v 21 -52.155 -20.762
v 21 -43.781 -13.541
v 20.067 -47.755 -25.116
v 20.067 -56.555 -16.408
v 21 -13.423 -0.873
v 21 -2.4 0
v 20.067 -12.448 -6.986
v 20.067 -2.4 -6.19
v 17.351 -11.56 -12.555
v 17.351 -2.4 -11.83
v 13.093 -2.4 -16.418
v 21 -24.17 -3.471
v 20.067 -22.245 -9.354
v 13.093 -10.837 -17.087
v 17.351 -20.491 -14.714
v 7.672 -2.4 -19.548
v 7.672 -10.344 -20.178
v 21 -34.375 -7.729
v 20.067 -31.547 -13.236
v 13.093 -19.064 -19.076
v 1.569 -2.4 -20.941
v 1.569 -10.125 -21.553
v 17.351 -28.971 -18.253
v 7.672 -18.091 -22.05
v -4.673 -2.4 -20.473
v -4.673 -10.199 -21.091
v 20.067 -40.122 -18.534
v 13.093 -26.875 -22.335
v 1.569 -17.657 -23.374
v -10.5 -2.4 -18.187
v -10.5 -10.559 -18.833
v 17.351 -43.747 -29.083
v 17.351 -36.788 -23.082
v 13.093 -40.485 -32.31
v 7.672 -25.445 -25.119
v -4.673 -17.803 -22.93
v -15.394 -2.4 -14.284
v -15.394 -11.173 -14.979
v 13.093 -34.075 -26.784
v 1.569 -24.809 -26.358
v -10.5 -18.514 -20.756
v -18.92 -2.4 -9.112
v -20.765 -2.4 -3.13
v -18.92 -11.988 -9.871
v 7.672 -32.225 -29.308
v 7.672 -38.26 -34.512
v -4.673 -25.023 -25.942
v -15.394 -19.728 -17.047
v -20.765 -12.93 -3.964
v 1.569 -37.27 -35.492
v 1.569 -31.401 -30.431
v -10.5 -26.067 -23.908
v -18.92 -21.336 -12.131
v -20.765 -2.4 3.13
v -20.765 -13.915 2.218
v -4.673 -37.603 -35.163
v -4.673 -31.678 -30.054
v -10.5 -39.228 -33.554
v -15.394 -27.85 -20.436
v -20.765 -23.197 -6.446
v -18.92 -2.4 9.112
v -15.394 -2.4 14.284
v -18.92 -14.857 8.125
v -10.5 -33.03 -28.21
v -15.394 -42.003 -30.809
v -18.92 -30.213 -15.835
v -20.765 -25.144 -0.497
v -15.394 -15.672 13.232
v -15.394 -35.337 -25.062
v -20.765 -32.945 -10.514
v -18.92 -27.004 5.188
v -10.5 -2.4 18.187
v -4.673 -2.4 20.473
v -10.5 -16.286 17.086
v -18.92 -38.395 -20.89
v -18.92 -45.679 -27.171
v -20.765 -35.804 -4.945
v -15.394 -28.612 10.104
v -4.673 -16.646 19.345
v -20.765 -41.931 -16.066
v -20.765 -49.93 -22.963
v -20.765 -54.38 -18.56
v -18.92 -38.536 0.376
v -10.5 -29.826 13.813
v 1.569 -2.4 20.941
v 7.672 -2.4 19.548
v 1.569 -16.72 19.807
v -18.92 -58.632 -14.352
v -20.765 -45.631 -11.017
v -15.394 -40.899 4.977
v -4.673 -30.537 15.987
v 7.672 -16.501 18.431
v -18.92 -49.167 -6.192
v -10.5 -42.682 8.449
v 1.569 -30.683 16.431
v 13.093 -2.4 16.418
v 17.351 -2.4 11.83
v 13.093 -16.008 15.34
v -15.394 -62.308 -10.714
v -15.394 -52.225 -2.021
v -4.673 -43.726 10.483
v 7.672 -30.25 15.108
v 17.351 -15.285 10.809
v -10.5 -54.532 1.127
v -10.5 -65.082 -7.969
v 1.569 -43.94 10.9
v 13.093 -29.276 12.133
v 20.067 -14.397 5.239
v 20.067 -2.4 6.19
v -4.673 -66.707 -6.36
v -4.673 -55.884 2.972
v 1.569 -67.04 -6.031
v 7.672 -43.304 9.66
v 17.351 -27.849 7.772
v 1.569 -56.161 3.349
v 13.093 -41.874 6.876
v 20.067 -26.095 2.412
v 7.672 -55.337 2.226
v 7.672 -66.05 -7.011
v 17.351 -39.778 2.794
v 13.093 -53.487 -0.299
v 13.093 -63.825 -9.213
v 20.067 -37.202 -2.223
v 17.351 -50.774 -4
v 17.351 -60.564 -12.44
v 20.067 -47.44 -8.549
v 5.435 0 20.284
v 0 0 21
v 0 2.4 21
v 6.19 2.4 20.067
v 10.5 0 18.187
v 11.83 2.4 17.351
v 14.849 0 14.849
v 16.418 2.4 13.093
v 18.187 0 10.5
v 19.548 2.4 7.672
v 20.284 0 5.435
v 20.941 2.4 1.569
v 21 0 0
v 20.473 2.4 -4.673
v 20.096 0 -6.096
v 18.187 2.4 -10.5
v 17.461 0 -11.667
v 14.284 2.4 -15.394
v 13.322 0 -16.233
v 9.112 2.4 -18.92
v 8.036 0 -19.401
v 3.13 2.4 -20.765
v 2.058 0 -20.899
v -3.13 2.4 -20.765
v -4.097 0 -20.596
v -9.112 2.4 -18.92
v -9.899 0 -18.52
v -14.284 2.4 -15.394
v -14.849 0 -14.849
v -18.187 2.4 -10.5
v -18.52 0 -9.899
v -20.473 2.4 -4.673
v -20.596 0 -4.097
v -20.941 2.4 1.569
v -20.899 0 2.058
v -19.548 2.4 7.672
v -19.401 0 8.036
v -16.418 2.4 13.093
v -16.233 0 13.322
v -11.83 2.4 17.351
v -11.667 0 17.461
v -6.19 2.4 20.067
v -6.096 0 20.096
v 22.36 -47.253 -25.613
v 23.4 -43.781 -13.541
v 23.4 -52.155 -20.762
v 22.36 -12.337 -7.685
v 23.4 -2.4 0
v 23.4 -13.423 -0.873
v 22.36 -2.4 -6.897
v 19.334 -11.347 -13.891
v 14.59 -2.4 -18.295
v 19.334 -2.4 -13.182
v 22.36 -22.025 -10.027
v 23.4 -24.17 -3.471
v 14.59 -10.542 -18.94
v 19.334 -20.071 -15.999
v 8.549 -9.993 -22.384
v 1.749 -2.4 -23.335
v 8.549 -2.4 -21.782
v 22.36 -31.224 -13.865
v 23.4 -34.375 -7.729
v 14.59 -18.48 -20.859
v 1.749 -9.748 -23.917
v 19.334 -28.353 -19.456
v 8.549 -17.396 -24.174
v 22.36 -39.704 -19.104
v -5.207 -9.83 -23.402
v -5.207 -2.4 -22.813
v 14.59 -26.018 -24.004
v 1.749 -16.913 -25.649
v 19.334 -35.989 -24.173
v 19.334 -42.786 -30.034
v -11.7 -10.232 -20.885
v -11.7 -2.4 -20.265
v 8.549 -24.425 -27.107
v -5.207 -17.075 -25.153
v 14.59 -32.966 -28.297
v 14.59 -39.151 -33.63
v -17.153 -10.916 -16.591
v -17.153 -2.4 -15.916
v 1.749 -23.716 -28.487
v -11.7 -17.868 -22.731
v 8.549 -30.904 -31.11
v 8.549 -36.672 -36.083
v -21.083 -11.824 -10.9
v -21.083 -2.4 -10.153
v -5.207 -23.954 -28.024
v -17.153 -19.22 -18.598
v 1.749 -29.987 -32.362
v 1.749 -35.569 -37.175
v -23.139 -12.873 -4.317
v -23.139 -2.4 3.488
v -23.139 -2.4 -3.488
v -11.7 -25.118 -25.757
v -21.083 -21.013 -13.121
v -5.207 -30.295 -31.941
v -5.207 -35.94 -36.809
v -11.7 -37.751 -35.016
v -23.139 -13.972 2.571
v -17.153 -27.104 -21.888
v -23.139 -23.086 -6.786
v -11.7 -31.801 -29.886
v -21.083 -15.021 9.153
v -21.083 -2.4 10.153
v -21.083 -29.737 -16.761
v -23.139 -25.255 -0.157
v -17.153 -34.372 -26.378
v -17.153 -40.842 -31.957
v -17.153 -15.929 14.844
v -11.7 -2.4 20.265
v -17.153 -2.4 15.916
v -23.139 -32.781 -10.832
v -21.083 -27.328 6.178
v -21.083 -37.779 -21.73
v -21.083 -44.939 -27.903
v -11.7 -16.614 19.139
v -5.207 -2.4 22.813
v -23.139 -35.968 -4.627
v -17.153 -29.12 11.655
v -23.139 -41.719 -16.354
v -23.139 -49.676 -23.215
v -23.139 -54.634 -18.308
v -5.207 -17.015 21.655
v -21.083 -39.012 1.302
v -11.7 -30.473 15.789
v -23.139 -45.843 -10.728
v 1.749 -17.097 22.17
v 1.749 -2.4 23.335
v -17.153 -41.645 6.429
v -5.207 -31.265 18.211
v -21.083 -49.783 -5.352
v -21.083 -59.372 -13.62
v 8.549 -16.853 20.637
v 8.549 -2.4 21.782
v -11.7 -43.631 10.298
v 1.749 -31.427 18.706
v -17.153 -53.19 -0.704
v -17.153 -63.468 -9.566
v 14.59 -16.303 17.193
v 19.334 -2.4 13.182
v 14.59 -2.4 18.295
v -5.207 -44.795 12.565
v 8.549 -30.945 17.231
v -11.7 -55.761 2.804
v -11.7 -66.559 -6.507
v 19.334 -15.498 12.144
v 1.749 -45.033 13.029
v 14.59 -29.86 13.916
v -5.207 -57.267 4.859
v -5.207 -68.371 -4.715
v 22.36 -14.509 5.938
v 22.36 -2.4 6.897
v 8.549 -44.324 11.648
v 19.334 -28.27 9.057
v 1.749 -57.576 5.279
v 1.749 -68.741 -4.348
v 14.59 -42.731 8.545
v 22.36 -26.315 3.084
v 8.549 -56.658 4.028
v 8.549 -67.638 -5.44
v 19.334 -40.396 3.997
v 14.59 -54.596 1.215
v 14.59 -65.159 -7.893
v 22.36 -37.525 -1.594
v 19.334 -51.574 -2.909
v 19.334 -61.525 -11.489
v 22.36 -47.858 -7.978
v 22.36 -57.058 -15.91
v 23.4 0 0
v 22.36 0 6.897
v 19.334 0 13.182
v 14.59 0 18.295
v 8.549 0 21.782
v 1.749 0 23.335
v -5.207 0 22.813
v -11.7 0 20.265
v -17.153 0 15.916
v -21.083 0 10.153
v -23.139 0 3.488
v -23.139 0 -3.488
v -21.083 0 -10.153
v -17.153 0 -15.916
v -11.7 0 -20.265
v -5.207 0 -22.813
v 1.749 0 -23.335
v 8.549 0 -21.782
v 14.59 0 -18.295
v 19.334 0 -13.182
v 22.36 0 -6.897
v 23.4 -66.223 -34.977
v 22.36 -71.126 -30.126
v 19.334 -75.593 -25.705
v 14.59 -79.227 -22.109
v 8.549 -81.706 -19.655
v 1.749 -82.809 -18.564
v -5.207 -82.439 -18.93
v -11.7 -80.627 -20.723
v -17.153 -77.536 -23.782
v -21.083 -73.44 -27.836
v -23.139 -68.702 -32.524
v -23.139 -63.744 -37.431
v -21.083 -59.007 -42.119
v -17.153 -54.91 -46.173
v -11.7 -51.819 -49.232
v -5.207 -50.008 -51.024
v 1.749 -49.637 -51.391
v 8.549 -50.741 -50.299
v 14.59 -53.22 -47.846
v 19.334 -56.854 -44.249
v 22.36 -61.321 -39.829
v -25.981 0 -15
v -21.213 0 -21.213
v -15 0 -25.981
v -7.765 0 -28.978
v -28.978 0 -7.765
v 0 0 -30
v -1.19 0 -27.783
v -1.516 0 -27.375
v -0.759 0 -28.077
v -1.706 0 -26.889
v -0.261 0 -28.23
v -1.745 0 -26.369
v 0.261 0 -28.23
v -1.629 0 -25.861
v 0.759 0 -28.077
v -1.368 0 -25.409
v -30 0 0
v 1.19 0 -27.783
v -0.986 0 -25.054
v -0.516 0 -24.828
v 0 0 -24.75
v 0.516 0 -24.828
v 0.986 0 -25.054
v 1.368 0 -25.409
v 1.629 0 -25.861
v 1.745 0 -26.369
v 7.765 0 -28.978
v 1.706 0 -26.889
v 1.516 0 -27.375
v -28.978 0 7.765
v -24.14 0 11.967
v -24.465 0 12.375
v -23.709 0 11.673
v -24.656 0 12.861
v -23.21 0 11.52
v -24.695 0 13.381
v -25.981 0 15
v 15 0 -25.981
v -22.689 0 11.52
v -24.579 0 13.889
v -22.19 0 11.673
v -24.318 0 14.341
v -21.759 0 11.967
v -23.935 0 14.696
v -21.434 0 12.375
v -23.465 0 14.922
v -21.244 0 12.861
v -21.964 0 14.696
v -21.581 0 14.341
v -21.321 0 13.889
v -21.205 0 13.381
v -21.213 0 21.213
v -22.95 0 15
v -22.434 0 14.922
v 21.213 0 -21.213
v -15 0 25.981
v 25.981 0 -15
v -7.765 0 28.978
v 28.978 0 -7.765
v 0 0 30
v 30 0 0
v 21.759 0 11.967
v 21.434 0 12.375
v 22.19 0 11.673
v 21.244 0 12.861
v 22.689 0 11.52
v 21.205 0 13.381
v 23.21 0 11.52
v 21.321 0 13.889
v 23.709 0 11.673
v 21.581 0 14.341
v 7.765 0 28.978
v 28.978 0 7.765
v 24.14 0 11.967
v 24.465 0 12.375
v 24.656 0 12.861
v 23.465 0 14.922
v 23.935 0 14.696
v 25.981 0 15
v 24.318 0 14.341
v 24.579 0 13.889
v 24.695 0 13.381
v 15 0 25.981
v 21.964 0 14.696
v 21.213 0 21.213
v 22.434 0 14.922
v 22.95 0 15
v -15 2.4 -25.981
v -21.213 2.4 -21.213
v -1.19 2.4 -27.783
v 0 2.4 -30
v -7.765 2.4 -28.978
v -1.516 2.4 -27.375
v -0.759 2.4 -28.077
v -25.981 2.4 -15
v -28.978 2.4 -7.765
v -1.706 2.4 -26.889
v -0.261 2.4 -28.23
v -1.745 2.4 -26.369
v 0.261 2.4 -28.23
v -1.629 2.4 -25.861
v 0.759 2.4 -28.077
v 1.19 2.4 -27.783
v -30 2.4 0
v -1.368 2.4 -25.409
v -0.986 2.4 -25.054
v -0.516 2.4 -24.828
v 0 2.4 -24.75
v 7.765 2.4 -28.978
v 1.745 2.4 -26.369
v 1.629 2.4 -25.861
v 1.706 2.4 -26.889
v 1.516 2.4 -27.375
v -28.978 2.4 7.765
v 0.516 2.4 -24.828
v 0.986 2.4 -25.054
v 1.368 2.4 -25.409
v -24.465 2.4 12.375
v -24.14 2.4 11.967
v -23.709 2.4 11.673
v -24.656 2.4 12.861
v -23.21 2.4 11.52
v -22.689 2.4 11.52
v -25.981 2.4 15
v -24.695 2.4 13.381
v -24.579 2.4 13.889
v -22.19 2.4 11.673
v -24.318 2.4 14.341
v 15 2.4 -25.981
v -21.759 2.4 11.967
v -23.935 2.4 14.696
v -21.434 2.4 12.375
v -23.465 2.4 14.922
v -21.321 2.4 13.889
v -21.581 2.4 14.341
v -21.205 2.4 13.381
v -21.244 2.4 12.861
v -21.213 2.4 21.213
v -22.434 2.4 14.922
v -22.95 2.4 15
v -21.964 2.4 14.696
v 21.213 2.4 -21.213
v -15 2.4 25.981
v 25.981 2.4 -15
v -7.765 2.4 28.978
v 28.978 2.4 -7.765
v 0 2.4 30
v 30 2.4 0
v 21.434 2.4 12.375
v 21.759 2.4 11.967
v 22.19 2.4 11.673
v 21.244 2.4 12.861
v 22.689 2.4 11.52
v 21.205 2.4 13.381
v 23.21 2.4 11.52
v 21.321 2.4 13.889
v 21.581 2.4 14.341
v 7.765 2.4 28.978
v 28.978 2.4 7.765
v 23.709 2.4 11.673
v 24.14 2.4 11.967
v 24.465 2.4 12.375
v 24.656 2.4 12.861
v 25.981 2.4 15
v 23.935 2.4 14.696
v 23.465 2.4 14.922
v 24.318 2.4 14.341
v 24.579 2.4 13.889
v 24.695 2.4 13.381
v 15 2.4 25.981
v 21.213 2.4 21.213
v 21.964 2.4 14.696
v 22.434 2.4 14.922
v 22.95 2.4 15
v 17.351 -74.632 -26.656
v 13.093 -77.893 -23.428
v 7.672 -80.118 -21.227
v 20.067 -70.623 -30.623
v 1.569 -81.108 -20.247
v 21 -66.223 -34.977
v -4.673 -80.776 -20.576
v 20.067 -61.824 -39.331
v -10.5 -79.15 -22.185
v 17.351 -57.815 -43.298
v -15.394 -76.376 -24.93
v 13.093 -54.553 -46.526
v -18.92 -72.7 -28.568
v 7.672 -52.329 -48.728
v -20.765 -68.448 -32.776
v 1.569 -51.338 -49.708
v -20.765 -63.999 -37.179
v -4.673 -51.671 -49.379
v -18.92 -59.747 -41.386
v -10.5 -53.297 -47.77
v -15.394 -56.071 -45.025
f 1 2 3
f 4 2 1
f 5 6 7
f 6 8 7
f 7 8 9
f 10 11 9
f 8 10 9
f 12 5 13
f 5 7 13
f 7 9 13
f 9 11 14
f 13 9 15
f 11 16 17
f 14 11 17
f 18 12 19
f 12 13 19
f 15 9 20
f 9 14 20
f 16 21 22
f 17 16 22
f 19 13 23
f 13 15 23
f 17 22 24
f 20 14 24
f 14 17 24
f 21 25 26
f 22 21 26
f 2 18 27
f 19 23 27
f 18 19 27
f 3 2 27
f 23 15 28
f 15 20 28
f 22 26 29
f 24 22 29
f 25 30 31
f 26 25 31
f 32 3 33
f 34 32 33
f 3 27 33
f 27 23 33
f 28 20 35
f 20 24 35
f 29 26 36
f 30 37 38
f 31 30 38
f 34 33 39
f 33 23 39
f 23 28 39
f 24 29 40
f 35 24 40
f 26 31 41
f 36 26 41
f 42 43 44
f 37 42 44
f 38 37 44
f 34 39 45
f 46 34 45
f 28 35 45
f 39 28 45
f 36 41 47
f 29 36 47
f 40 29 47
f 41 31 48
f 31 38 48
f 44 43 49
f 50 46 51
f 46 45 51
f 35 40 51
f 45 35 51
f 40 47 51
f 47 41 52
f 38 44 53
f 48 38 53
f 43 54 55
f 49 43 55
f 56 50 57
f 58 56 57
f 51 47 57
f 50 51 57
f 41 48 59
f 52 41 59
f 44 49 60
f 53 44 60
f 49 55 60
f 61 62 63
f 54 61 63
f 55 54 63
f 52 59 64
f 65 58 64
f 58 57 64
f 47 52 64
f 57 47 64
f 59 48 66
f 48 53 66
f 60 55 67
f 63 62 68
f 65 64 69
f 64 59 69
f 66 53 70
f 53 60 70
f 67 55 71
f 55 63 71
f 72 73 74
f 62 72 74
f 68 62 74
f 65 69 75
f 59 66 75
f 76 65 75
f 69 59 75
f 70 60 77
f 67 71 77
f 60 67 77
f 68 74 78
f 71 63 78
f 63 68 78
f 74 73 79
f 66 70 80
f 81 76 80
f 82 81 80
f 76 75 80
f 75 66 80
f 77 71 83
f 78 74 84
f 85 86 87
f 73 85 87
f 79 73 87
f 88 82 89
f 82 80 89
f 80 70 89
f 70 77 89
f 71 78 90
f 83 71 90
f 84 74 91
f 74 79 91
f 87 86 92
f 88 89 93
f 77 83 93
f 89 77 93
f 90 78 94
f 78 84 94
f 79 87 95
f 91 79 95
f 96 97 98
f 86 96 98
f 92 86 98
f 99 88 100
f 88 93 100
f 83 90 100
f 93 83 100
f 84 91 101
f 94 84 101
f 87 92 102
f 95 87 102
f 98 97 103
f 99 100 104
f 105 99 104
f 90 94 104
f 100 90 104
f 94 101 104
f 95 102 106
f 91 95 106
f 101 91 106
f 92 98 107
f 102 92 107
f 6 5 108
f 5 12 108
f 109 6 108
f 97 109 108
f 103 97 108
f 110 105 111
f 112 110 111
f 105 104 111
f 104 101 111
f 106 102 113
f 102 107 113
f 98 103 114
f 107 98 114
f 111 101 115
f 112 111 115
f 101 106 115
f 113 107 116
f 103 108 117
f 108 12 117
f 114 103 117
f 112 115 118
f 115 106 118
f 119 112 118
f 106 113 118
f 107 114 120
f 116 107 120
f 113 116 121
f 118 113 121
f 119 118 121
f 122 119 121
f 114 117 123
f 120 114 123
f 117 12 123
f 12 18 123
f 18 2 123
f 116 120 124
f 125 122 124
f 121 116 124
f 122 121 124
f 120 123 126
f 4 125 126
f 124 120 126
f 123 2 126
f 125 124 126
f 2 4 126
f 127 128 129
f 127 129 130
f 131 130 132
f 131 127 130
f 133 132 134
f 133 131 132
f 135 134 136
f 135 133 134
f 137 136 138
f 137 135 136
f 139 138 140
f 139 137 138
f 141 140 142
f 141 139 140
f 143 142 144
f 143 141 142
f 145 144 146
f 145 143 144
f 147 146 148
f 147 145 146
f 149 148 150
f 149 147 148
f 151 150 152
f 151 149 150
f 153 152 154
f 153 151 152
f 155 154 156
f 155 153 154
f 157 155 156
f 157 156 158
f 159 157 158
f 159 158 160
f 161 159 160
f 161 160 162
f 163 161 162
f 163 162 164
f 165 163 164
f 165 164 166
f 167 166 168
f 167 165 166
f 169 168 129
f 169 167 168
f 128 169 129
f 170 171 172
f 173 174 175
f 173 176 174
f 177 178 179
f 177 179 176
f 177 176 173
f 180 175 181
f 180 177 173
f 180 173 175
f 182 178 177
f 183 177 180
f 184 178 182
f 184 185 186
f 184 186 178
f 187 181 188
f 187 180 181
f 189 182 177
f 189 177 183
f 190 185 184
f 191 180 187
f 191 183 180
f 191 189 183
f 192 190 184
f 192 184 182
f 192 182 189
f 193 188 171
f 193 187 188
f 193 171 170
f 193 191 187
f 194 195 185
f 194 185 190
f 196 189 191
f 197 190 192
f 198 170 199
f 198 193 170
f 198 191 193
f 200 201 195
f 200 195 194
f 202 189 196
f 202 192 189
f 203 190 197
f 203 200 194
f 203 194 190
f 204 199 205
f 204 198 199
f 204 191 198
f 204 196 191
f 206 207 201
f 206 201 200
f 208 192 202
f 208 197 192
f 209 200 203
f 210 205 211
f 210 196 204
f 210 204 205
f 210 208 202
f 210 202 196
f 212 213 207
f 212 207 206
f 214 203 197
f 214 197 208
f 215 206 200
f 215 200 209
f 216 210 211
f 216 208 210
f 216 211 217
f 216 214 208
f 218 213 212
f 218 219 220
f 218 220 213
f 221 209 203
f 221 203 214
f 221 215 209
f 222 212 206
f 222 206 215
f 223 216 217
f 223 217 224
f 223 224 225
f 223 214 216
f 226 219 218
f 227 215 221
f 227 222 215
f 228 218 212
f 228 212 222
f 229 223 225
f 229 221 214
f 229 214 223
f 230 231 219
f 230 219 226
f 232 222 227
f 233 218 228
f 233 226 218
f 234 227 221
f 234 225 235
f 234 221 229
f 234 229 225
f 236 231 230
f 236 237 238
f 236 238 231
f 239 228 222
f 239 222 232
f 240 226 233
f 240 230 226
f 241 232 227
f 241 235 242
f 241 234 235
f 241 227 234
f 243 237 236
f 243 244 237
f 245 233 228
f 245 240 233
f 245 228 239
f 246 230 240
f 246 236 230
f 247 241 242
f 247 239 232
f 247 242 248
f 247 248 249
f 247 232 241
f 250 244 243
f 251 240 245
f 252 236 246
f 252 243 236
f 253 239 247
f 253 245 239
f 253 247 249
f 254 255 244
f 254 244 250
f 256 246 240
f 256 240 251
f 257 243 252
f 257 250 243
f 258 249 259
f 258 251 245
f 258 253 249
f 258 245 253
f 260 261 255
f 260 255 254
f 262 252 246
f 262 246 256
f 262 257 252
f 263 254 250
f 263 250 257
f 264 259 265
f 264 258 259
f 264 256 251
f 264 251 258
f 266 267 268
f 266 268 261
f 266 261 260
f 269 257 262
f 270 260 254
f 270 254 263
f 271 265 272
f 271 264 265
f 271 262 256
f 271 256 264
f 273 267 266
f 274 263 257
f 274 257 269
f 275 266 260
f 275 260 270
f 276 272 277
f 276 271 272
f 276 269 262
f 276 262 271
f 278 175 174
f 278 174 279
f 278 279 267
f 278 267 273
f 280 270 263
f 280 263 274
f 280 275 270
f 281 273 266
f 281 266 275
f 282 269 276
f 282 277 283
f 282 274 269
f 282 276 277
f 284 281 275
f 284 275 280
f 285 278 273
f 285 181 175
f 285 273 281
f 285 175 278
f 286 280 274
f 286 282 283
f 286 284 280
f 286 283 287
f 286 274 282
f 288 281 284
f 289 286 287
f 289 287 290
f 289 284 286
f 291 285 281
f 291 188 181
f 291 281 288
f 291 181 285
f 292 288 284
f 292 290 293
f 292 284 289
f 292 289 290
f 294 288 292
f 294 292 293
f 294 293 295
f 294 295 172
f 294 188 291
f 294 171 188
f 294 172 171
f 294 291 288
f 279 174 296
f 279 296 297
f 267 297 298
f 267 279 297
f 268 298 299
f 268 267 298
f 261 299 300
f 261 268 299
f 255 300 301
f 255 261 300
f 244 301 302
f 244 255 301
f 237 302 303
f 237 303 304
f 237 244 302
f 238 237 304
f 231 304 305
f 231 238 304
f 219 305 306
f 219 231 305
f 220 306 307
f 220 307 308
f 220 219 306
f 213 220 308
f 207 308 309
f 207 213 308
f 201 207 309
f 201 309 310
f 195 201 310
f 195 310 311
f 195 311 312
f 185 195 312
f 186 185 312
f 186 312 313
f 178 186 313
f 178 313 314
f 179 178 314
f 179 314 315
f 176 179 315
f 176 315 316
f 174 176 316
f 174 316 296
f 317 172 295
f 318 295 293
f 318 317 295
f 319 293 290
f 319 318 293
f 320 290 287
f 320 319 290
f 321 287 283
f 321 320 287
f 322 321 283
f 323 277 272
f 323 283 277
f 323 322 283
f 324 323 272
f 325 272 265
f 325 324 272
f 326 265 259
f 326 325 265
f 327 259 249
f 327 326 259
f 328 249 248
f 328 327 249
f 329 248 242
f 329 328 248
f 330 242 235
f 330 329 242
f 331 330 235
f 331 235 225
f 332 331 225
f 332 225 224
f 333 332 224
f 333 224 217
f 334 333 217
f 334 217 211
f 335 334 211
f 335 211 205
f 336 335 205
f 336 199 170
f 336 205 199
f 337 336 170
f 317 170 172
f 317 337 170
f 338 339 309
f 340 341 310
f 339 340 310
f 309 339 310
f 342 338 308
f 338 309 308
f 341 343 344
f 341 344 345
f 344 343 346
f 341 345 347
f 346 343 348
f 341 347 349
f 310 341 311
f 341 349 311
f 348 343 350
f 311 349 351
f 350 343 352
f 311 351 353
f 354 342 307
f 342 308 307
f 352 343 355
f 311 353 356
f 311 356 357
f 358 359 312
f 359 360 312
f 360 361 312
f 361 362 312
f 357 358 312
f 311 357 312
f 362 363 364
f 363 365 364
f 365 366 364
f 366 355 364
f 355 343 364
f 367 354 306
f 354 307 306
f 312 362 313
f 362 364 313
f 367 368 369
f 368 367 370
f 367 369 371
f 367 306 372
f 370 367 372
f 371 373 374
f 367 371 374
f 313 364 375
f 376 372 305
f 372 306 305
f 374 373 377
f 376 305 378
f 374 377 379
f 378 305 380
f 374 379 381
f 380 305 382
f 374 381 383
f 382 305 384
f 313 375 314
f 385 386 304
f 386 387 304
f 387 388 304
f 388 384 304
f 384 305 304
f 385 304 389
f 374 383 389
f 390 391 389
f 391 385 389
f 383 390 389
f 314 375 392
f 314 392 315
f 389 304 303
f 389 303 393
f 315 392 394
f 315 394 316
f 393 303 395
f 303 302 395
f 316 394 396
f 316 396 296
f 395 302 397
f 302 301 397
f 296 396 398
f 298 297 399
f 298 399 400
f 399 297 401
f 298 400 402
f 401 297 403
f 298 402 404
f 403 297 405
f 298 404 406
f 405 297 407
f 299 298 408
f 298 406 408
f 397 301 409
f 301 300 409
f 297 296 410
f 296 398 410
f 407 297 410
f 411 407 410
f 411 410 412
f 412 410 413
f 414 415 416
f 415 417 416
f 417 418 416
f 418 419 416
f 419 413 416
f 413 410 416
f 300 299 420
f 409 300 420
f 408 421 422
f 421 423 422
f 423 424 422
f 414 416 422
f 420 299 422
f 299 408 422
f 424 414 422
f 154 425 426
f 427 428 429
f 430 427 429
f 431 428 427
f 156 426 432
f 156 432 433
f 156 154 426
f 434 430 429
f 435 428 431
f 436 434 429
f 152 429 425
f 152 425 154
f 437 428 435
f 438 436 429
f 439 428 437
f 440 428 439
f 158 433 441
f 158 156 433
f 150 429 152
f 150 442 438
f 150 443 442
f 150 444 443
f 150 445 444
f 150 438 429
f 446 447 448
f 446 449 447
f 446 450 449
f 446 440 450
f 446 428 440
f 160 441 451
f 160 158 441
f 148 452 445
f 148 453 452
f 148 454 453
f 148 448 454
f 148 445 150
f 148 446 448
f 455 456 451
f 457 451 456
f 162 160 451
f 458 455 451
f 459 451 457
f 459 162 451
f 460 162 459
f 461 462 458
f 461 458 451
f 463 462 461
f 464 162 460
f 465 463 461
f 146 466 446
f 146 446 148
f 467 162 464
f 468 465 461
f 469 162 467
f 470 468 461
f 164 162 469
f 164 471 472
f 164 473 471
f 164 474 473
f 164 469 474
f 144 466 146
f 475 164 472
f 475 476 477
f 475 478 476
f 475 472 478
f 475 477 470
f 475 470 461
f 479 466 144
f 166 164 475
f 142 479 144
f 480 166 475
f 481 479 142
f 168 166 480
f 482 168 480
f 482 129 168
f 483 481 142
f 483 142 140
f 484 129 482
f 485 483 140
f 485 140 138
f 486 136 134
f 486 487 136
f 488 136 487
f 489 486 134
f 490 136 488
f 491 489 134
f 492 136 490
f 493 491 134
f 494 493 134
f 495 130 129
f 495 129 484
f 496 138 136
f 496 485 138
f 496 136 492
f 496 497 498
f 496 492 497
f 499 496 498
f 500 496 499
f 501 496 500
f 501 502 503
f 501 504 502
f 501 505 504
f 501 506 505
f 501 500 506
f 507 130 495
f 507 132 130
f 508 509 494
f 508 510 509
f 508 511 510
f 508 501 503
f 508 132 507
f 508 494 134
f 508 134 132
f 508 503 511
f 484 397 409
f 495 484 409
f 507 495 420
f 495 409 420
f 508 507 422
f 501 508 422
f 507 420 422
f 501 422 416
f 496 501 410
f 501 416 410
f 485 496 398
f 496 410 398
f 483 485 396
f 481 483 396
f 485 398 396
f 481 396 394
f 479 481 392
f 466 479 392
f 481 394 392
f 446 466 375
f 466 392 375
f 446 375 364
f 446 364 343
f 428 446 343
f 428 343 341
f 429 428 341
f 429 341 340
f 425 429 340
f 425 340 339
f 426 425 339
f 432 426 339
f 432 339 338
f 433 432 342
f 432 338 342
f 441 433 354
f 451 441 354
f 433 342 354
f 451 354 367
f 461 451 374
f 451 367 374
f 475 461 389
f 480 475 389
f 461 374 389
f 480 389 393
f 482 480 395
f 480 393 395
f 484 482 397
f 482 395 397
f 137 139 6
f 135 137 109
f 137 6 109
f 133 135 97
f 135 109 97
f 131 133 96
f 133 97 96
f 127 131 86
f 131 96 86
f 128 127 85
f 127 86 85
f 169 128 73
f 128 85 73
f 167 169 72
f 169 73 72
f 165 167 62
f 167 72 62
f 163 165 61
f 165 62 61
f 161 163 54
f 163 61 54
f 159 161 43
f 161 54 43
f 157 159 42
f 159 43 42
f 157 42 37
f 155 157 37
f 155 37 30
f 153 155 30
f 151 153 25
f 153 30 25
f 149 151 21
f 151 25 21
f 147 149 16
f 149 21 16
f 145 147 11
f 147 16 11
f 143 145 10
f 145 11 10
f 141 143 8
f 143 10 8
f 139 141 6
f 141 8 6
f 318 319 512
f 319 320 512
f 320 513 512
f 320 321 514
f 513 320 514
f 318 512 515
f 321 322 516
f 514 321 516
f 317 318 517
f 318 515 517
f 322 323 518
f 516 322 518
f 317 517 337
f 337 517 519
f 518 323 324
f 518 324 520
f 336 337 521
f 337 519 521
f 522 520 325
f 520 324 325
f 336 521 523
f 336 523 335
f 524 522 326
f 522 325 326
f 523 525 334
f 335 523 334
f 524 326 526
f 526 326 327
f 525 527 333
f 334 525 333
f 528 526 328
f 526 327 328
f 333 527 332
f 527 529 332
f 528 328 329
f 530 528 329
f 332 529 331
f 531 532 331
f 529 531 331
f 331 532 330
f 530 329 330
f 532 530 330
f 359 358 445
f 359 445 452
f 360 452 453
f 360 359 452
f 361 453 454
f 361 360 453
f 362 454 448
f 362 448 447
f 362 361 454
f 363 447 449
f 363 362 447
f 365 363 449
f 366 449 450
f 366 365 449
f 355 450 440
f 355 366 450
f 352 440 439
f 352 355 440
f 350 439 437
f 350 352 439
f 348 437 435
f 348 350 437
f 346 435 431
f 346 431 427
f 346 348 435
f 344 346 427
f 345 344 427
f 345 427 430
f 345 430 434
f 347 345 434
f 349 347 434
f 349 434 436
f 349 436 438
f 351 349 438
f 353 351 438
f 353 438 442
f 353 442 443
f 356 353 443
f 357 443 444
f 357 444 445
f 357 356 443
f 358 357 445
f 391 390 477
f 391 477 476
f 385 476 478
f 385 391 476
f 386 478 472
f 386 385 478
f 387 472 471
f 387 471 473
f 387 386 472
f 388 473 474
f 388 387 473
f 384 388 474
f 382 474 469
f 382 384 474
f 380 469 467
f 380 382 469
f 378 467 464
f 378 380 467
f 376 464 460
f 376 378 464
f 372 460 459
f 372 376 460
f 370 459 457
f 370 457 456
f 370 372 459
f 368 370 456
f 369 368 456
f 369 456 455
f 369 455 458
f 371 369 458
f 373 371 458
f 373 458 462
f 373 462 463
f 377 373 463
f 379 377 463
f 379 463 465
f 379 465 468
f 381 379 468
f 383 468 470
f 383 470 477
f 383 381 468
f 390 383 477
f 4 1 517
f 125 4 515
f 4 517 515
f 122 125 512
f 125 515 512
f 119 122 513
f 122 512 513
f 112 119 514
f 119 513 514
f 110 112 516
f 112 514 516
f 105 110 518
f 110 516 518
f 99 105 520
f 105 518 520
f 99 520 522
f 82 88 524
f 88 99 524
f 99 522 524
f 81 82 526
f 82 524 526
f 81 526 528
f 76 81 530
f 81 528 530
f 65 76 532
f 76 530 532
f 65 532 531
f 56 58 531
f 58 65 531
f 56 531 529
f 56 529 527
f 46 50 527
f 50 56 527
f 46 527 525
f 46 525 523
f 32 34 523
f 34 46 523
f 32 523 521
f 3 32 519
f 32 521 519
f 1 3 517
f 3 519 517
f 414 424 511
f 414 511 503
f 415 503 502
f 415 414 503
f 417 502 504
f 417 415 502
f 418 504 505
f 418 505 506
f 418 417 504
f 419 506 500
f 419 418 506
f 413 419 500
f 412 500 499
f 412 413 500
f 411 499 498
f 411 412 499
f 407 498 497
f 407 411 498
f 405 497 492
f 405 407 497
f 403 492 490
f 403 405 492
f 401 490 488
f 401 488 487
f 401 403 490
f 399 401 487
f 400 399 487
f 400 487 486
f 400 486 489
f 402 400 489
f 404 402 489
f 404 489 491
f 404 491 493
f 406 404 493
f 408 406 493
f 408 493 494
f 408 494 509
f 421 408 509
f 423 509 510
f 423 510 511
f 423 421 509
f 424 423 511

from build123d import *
from build123d.topology import SkipClean

# Parameters (mm, degrees)
SKETCH2_R           = 23.4
SKETCH2_R_2         = 21
SKETCH4_R           = 30
SKETCH4_R_2         = 21
SKETCH4_R_3         = 1.75
BOSS_EXTRUDE1_DEPTH = 2.4


with BuildPart() as part:
    # Sweep1: sweep along a path in Sketch1
    with BuildLine(Plane(origin=(0, 0, 0), x_dir=(0, 0, -1), z_dir=(1, 0, 0))) as sweep1_path:
        Line((0, 0), (0, -2.4))
        ThreePointArc((0, -2.4), (5.398568754, -29.356540598), (20.761573743, -52.155174402))
        Line((20.761573743, -52.155174402), (34.977337858, -66.223296189))
    # Sketch2 → Sweep1 (sweep)
    with BuildSketch(Plane(origin=(0, 0, 0), x_dir=(1, 0, 0), z_dir=(0, 1, 0))):
        Circle(SKETCH2_R)
        Circle(SKETCH2_R_2, mode=Mode.SUBTRACT)
    sweep(path=sweep1_path.line)

    # Sketch4 → Boss-Extrude1 (add)
    with SkipClean():  # the faces are left unmerged after this step: merging them gives an invalid solid
        with BuildSketch(Plane(origin=(0, 0, 0), x_dir=(1, 0, 0), z_dir=(0, 1, 0))):
            with Locations(Location((0, 0, 0), (0, 0, 270))):
                Circle(SKETCH4_R)
            with Locations(Location((0, 0, 0), (0, 0, 270))):
                Circle(SKETCH4_R_2, mode=Mode.SUBTRACT)
            with Locations(Location((0, 26.5, 0), (0, 0, 270))):
                Circle(SKETCH4_R_3, mode=Mode.SUBTRACT)
            with Locations(Location((22.9496732, -13.25, 0), (0, 0, 270))):
                Circle(SKETCH4_R_3, mode=Mode.SUBTRACT)
            with Locations(Location((-22.9496732, -13.25, 0), (0, 0, 270))):
                Circle(SKETCH4_R_3, mode=Mode.SUBTRACT)
        extrude(amount=BOSS_EXTRUDE1_DEPTH)


solid = part.part
